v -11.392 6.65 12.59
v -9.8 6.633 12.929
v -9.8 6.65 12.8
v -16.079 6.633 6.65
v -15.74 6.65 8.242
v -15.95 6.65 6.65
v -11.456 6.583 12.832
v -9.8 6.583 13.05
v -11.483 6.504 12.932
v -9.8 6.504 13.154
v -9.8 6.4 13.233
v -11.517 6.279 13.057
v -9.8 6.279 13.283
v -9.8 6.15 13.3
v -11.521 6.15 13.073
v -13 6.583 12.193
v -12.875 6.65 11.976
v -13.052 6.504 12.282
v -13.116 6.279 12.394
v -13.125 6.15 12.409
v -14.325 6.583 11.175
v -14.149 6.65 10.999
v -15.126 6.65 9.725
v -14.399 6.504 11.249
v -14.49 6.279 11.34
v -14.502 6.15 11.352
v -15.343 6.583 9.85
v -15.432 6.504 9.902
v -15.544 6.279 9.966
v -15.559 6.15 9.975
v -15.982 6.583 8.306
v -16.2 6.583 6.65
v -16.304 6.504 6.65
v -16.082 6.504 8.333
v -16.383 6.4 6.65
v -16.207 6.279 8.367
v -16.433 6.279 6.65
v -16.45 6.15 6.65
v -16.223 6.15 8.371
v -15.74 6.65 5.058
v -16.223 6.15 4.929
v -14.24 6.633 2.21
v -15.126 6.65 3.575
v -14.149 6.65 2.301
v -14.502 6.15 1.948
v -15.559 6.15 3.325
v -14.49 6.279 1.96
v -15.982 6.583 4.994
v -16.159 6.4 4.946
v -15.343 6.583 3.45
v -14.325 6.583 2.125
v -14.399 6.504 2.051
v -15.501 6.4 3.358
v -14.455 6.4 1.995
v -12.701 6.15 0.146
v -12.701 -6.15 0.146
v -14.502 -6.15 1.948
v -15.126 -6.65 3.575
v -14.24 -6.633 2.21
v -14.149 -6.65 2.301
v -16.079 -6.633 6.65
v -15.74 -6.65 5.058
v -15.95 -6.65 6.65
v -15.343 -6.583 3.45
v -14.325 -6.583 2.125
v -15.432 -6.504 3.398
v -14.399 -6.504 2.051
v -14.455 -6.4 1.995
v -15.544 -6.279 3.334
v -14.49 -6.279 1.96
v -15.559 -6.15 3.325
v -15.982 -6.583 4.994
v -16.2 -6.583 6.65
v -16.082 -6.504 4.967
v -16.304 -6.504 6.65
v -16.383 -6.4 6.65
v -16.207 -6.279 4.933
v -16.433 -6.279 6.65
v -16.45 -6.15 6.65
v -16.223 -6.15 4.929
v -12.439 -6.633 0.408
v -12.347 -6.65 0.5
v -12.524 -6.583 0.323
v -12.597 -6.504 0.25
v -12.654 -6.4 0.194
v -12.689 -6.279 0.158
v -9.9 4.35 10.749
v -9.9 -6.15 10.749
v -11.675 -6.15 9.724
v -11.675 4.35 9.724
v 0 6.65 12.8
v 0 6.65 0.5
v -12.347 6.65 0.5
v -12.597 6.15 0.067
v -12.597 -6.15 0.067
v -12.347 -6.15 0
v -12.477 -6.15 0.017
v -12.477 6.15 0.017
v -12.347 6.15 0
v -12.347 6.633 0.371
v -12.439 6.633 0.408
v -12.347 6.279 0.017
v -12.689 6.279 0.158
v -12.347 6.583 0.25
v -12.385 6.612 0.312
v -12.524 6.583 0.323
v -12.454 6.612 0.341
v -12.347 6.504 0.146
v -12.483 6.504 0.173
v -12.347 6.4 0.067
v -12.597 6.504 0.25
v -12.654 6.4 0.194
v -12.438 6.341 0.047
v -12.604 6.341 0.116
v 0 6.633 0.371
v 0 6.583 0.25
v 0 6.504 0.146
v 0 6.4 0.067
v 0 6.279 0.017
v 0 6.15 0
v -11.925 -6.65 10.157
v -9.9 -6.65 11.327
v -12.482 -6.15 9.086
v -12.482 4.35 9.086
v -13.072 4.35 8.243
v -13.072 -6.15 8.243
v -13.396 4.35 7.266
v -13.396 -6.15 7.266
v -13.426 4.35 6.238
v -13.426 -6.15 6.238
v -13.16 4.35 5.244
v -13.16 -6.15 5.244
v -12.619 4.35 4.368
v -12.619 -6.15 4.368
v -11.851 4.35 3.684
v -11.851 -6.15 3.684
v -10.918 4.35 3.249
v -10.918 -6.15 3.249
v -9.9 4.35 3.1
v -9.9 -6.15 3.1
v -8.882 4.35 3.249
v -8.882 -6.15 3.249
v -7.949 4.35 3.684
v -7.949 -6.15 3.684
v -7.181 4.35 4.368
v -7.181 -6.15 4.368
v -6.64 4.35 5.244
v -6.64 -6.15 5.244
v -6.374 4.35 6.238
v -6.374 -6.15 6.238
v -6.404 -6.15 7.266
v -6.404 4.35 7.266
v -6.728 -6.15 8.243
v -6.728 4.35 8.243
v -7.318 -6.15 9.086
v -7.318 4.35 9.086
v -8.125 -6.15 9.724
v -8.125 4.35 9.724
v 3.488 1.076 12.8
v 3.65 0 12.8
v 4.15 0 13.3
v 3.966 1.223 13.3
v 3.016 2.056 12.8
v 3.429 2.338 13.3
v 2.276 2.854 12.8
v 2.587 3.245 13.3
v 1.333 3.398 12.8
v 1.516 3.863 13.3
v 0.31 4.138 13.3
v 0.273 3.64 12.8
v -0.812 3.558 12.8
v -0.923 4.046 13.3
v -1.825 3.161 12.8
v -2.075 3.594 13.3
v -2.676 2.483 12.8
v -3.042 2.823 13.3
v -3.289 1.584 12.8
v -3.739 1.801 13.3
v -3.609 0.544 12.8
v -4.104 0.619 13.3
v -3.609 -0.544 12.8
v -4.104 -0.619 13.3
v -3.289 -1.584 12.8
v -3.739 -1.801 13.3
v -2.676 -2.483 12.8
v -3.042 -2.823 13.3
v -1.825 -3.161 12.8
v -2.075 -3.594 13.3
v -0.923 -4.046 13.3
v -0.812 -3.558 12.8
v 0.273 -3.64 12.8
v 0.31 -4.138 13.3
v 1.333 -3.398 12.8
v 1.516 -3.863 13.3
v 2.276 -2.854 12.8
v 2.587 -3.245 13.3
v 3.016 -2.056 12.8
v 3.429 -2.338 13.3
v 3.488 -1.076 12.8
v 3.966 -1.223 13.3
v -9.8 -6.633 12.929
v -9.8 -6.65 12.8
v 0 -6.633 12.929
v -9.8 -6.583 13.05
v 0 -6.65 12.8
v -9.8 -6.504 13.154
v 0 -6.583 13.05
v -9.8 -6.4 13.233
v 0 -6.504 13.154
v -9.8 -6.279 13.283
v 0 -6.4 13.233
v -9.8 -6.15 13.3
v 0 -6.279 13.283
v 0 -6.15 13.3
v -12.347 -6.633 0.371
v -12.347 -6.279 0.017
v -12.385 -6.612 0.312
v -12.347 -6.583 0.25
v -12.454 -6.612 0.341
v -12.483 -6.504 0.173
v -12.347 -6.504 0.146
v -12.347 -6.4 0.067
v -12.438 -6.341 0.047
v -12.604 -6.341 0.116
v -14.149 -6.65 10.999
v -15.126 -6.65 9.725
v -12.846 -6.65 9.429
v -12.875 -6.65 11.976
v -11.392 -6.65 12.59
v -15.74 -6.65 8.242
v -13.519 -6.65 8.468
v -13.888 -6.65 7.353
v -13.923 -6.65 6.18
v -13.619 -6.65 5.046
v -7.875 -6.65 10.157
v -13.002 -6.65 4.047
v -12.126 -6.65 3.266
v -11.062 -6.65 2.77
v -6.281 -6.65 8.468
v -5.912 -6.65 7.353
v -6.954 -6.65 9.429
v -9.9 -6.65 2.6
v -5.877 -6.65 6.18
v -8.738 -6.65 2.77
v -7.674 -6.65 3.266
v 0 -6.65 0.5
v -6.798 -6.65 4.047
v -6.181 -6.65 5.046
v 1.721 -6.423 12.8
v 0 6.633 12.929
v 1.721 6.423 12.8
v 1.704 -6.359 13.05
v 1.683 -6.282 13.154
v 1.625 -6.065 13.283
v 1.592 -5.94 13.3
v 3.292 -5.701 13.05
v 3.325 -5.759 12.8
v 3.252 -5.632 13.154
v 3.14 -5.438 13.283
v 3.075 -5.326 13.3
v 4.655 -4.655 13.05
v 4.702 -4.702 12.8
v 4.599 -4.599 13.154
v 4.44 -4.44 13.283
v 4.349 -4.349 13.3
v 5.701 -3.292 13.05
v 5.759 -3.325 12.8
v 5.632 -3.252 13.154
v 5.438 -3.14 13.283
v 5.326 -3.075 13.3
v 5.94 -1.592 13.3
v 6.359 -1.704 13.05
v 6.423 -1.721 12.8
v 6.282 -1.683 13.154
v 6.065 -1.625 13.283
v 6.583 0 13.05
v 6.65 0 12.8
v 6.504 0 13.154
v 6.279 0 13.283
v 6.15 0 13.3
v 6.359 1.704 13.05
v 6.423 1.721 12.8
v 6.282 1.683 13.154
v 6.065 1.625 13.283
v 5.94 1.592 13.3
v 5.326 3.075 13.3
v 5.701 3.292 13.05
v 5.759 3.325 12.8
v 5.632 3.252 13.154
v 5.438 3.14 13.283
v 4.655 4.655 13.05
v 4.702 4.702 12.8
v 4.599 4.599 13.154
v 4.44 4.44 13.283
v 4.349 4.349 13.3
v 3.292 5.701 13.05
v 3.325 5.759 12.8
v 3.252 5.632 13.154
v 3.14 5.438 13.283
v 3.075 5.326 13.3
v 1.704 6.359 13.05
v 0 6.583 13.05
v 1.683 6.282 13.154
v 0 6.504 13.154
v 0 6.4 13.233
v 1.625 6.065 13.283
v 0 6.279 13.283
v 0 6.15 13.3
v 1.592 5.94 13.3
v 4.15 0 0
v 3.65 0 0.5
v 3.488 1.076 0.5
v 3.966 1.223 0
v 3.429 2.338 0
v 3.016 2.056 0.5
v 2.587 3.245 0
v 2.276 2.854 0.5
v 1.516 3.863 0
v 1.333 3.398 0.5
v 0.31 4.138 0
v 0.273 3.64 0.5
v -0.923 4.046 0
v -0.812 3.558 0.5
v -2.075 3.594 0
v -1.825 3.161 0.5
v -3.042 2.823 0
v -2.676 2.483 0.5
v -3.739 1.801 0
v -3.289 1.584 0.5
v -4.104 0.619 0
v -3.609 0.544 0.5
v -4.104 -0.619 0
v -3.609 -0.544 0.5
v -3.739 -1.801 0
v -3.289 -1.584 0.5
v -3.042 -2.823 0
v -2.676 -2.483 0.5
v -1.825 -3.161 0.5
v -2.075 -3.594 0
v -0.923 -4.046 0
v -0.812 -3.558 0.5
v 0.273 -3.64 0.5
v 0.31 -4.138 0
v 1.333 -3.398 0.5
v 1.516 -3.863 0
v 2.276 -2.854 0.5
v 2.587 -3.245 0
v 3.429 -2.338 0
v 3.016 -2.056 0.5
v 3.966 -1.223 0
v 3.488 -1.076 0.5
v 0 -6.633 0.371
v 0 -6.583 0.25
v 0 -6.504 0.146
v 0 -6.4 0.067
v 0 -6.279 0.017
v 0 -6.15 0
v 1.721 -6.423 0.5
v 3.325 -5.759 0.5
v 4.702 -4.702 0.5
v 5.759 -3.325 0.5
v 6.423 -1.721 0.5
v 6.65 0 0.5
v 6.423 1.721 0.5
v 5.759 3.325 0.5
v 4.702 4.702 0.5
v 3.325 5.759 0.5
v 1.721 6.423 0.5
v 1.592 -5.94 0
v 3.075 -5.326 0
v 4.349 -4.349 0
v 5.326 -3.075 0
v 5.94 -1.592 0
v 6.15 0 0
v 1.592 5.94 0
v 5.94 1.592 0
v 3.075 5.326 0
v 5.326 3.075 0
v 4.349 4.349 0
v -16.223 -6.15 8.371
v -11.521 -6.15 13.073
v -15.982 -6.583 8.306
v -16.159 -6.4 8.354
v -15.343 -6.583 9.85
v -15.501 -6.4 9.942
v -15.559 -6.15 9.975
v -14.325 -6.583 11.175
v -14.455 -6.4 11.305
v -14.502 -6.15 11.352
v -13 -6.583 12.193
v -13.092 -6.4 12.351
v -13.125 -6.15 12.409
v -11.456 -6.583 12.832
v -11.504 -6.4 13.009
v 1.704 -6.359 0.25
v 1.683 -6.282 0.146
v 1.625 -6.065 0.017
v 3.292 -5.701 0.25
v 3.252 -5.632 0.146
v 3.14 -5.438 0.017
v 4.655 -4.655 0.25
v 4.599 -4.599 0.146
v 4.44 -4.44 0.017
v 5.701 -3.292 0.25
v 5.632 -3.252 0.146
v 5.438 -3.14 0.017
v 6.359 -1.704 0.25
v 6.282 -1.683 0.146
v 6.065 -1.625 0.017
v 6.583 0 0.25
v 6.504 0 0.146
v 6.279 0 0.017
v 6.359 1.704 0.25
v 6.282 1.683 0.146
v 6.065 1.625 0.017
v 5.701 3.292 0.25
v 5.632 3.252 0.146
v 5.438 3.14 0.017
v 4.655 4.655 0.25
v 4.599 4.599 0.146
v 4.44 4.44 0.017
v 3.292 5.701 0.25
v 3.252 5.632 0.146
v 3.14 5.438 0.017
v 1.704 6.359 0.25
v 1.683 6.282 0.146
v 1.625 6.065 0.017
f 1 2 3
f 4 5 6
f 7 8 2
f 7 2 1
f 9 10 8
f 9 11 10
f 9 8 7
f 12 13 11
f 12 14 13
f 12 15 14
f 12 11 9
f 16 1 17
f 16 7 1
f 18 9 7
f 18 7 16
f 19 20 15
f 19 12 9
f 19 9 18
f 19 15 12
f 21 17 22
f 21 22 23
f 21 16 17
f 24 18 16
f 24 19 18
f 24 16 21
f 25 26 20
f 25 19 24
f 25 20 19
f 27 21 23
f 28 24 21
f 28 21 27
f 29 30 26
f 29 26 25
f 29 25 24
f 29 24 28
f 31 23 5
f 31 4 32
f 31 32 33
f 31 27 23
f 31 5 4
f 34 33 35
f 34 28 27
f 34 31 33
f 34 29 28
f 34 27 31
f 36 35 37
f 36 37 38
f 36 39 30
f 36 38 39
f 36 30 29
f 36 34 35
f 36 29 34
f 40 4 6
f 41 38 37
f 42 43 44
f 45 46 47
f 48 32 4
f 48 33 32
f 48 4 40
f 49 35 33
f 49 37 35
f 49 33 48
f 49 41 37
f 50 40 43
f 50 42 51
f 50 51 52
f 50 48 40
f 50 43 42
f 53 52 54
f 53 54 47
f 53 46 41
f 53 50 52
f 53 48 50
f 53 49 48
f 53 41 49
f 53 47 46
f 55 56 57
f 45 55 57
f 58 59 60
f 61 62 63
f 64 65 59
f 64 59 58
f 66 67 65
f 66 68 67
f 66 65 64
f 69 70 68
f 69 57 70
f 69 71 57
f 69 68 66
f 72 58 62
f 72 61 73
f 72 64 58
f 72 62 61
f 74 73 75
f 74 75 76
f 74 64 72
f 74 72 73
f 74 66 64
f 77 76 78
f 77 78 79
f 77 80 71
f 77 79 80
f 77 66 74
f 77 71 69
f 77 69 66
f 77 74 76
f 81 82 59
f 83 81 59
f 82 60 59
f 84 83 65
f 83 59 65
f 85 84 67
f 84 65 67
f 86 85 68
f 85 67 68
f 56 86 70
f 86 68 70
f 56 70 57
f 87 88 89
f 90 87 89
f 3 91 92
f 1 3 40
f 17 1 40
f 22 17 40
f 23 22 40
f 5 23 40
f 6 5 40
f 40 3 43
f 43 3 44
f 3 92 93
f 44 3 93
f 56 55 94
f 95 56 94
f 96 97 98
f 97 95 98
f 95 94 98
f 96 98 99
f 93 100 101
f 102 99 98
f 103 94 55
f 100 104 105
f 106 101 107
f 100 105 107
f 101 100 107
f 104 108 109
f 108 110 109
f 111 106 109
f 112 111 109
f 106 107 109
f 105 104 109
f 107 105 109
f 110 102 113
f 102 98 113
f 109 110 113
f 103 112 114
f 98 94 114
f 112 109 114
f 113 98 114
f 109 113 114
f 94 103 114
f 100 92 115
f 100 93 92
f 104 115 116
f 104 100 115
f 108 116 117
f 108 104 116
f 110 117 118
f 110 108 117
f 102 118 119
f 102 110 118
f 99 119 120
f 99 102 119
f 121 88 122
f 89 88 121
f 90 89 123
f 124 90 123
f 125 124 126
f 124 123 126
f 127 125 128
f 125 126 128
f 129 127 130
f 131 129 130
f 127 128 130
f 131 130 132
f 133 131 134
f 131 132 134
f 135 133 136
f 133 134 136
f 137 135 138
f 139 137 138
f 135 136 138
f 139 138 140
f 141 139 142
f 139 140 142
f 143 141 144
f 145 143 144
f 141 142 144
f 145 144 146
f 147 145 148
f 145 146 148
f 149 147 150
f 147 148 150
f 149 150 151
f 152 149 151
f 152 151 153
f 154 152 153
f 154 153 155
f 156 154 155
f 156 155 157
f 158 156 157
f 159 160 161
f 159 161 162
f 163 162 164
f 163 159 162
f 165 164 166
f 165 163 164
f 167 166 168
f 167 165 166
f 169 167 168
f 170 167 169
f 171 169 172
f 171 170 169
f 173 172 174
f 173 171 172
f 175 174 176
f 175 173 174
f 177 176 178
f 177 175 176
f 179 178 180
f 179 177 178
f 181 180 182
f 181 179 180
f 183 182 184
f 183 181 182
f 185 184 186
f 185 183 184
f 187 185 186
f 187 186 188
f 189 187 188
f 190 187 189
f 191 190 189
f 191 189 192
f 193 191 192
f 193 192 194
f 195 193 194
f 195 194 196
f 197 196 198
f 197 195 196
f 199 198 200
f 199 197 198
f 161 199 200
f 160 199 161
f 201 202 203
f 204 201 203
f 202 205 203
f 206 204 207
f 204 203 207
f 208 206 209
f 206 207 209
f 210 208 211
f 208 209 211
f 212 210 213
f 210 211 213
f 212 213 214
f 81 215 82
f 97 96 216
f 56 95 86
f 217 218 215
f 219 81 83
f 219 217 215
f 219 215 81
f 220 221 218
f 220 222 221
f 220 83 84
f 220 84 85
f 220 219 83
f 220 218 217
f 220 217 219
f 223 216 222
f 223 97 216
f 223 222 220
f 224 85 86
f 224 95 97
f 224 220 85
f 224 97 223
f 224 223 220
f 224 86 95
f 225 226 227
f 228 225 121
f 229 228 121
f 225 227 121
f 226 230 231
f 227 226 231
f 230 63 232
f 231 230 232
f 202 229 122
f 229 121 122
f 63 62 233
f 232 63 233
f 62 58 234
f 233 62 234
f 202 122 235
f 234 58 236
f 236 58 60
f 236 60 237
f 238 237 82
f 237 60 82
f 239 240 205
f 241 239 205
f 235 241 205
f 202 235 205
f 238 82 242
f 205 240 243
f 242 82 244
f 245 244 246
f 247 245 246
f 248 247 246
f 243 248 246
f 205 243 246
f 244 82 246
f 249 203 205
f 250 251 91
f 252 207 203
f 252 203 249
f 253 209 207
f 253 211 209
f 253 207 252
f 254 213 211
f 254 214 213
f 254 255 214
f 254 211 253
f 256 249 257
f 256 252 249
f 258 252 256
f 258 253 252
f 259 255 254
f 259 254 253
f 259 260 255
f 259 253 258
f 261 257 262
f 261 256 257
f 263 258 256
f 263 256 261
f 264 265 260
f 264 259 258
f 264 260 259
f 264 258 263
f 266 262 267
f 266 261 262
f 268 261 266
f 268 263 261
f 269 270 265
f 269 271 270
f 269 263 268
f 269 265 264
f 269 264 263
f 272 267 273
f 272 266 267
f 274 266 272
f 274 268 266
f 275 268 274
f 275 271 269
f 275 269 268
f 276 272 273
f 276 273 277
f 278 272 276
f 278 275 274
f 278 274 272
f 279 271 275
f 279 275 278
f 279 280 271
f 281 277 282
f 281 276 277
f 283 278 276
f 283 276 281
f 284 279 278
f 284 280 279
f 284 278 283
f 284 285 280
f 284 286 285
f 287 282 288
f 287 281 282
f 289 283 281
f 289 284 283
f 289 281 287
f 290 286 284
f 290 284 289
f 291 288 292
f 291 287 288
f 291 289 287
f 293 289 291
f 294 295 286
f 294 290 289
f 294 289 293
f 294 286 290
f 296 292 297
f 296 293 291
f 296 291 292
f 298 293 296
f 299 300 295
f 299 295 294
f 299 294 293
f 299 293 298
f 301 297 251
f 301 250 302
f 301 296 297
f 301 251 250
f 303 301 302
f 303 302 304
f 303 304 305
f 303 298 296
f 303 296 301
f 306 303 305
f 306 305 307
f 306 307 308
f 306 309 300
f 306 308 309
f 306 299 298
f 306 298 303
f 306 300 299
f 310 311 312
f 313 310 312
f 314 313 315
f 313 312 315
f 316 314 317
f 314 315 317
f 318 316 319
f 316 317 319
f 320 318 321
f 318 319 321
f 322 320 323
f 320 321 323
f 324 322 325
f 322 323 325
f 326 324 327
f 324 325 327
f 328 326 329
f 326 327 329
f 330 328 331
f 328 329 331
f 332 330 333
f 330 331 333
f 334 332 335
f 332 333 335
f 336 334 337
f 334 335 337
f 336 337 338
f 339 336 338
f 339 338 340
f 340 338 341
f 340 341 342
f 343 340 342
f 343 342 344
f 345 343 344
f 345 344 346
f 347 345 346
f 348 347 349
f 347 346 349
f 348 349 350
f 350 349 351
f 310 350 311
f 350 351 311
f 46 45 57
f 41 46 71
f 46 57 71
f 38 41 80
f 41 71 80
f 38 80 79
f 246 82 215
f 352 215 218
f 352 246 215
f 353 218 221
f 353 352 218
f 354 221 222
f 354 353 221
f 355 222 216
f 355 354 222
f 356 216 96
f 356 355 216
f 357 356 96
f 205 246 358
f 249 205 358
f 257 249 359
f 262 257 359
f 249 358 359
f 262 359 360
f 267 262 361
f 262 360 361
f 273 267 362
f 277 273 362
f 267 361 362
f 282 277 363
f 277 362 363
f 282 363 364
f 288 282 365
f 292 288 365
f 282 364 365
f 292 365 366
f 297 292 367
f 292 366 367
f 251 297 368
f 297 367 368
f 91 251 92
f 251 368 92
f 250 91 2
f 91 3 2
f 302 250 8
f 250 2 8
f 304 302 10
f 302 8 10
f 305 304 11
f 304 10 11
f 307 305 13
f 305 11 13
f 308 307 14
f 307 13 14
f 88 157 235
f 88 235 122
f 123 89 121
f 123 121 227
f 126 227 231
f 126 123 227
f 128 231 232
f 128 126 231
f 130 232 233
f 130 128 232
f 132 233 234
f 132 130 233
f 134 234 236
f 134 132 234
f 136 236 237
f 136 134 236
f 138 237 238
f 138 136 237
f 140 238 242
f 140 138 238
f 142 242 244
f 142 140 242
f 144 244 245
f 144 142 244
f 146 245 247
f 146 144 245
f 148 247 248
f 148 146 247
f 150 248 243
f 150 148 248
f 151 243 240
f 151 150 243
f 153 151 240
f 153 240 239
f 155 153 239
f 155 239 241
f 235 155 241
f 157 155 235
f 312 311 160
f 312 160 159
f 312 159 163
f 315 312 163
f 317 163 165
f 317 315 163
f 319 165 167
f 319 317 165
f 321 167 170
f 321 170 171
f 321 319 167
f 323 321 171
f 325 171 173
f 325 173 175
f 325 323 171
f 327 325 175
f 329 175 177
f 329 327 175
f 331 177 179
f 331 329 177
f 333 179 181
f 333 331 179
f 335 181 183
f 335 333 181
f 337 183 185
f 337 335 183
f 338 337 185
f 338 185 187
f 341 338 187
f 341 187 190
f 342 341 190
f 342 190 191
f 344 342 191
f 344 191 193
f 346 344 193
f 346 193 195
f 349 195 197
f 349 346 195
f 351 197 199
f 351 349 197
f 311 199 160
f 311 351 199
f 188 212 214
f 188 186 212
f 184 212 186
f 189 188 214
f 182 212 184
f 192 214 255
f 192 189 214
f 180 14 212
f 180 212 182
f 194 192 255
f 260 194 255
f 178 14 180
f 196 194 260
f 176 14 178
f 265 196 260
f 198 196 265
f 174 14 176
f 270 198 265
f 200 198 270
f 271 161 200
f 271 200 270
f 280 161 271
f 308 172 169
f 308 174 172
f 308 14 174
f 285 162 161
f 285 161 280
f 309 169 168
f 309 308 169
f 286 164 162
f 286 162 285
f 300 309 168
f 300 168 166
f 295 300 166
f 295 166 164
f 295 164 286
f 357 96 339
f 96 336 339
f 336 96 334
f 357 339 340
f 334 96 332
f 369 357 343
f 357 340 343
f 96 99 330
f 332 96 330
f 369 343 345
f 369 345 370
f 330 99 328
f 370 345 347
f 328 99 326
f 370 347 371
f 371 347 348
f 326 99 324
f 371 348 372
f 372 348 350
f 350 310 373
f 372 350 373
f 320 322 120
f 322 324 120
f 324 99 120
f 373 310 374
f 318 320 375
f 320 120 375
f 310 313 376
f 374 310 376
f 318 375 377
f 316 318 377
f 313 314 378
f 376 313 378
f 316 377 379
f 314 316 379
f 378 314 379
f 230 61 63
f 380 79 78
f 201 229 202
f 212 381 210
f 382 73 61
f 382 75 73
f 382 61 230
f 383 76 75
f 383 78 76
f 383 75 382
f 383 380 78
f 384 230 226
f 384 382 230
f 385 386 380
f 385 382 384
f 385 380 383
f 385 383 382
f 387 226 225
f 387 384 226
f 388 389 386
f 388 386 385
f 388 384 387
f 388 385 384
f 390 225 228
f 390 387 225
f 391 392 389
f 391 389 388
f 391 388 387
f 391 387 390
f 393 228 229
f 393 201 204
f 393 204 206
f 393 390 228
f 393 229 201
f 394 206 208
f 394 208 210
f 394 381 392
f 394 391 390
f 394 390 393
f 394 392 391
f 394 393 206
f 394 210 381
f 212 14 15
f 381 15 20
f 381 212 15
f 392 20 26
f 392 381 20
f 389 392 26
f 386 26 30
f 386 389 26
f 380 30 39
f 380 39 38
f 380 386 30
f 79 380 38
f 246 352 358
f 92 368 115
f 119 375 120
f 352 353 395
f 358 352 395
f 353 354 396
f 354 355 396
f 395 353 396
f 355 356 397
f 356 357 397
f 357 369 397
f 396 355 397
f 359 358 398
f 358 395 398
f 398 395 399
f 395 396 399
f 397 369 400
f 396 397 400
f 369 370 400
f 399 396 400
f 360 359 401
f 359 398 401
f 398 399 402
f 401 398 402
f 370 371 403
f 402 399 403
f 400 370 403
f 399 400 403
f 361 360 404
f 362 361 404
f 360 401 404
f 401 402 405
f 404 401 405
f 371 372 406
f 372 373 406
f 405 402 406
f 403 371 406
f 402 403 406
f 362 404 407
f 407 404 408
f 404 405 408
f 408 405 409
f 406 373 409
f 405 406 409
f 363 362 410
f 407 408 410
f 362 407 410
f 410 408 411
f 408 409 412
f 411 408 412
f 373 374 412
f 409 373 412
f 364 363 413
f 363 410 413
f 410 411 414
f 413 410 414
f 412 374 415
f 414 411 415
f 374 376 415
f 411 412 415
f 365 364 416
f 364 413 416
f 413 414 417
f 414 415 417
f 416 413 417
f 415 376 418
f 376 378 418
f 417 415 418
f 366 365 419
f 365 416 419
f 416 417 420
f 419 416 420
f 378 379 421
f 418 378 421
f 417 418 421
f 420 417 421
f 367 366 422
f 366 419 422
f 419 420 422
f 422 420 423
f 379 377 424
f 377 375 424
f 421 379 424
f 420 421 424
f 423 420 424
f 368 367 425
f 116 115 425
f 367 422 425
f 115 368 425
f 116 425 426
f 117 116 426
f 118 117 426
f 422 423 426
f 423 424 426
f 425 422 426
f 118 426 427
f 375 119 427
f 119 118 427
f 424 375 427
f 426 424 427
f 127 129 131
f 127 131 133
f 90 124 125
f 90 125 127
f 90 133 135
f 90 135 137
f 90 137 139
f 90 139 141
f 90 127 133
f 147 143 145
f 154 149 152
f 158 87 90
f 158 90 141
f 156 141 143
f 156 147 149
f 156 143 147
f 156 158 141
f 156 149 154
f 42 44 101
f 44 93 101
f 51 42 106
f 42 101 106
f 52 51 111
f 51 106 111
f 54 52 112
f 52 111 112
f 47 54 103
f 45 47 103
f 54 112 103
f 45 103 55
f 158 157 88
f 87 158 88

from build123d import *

# Parameters (mm, degrees)
F0_R     = 3.65
F1_DEPTH = 13.3
F3_DEPTH = 11
F4_R     = 6.65
F6_DEPTH = 25
F7_R     = 0.5
F8_SIZE  = 0.5


with BuildPart() as f1:
    # F0 (on Top) → F1 (new body)
    with BuildSketch(Plane.XY):
        with BuildLine():
            ThreePointArc((0, -6.65), (6.65, 0), (0, 6.65))
            Line((0, 6.65), (-16.45, 6.65))
            Line((-16.45, 6.65), (-16.45, -6.65))
            Line((-16.45, -6.65), (0, -6.65))
        make_face()
        with Locations((-9.8, 0)):
            Circle(F0_R, mode=Mode.SUBTRACT)
        Circle(F0_R, mode=Mode.SUBTRACT)
        with Locations((-9.8, 0)):
            Circle(F0_R)
    extrude(amount=F1_DEPTH)

    # F2 (on face) → F3 (cut)
    with BuildSketch(Plane.XZ.offset(6.65)):
        with BuildLine():
            Line((-9.9, 10.7491869112), (-11.675, 9.7243901834))
            ThreePointArc((-11.675, 9.7243901834), (-9.9, 3.1), (-8.125, 9.7243901834))
            Line((-8.125, 9.7243901834), (-9.9, 10.7491869112))
        make_face()
    extrude(amount=-F3_DEPTH, mode=Mode.SUBTRACT)

    # F4
    f4_edges = [f1.edges().sort_by_distance(p)[0] for p in [
        (-16.45, 0, 13.3),
    ]]
    fillet(f4_edges, radius=F4_R)

    # F5 (on face) → F6 (cut)
    with BuildSketch(Plane.XZ.offset(6.65)):
        with BuildLine():
            Line((-16.45, 0), (-12.5545201898, 0))
            Line((-12.5545201898, 0), (-14.5022600949, 1.9477399051))
            ThreePointArc((-14.5022600949, 1.9477399051), (-15.9437988912, 4.1051551748), (-16.45, 6.65))
            Line((-16.45, 6.65), (-16.45, 0))
        make_face()
    extrude(amount=-F6_DEPTH, mode=Mode.SUBTRACT)

    # F7
    f7_edges = [f1.edges().sort_by_distance(p)[0] for p in [
        (-4.9, -6.65, 13.3),
        (6.65, 0, 13.3),
        (-4.9, 6.65, 13.3),
        (-15.943799, 6.65, 9.194845),
        (-12.55452, 0, 0),
        (-13.52839, -6.65, 0.97387),
        (-6.27726, -6.65, 0),
        (6.65, 0, 0),
        (-15.943799, -6.65, 9.194845),
        (-6.27726, 6.65, 0),
        (-13.52839, 6.65, 0.97387),
    ]]
    fillet(f7_edges, radius=F7_R)

    # F8
    f8_edges = [f1.edges().sort_by_distance(p)[0] for p in [
        (-9.9, -6.65, 3.1),
        (-3.65, 0, 13.3),
        (-3.65, 0, 0),
        (-9.0125, -6.65, 10.236789),
        (-10.7875, -6.65, 10.236789),
    ]]
    chamfer(f8_edges, length=F8_SIZE)


solid = f1.part
